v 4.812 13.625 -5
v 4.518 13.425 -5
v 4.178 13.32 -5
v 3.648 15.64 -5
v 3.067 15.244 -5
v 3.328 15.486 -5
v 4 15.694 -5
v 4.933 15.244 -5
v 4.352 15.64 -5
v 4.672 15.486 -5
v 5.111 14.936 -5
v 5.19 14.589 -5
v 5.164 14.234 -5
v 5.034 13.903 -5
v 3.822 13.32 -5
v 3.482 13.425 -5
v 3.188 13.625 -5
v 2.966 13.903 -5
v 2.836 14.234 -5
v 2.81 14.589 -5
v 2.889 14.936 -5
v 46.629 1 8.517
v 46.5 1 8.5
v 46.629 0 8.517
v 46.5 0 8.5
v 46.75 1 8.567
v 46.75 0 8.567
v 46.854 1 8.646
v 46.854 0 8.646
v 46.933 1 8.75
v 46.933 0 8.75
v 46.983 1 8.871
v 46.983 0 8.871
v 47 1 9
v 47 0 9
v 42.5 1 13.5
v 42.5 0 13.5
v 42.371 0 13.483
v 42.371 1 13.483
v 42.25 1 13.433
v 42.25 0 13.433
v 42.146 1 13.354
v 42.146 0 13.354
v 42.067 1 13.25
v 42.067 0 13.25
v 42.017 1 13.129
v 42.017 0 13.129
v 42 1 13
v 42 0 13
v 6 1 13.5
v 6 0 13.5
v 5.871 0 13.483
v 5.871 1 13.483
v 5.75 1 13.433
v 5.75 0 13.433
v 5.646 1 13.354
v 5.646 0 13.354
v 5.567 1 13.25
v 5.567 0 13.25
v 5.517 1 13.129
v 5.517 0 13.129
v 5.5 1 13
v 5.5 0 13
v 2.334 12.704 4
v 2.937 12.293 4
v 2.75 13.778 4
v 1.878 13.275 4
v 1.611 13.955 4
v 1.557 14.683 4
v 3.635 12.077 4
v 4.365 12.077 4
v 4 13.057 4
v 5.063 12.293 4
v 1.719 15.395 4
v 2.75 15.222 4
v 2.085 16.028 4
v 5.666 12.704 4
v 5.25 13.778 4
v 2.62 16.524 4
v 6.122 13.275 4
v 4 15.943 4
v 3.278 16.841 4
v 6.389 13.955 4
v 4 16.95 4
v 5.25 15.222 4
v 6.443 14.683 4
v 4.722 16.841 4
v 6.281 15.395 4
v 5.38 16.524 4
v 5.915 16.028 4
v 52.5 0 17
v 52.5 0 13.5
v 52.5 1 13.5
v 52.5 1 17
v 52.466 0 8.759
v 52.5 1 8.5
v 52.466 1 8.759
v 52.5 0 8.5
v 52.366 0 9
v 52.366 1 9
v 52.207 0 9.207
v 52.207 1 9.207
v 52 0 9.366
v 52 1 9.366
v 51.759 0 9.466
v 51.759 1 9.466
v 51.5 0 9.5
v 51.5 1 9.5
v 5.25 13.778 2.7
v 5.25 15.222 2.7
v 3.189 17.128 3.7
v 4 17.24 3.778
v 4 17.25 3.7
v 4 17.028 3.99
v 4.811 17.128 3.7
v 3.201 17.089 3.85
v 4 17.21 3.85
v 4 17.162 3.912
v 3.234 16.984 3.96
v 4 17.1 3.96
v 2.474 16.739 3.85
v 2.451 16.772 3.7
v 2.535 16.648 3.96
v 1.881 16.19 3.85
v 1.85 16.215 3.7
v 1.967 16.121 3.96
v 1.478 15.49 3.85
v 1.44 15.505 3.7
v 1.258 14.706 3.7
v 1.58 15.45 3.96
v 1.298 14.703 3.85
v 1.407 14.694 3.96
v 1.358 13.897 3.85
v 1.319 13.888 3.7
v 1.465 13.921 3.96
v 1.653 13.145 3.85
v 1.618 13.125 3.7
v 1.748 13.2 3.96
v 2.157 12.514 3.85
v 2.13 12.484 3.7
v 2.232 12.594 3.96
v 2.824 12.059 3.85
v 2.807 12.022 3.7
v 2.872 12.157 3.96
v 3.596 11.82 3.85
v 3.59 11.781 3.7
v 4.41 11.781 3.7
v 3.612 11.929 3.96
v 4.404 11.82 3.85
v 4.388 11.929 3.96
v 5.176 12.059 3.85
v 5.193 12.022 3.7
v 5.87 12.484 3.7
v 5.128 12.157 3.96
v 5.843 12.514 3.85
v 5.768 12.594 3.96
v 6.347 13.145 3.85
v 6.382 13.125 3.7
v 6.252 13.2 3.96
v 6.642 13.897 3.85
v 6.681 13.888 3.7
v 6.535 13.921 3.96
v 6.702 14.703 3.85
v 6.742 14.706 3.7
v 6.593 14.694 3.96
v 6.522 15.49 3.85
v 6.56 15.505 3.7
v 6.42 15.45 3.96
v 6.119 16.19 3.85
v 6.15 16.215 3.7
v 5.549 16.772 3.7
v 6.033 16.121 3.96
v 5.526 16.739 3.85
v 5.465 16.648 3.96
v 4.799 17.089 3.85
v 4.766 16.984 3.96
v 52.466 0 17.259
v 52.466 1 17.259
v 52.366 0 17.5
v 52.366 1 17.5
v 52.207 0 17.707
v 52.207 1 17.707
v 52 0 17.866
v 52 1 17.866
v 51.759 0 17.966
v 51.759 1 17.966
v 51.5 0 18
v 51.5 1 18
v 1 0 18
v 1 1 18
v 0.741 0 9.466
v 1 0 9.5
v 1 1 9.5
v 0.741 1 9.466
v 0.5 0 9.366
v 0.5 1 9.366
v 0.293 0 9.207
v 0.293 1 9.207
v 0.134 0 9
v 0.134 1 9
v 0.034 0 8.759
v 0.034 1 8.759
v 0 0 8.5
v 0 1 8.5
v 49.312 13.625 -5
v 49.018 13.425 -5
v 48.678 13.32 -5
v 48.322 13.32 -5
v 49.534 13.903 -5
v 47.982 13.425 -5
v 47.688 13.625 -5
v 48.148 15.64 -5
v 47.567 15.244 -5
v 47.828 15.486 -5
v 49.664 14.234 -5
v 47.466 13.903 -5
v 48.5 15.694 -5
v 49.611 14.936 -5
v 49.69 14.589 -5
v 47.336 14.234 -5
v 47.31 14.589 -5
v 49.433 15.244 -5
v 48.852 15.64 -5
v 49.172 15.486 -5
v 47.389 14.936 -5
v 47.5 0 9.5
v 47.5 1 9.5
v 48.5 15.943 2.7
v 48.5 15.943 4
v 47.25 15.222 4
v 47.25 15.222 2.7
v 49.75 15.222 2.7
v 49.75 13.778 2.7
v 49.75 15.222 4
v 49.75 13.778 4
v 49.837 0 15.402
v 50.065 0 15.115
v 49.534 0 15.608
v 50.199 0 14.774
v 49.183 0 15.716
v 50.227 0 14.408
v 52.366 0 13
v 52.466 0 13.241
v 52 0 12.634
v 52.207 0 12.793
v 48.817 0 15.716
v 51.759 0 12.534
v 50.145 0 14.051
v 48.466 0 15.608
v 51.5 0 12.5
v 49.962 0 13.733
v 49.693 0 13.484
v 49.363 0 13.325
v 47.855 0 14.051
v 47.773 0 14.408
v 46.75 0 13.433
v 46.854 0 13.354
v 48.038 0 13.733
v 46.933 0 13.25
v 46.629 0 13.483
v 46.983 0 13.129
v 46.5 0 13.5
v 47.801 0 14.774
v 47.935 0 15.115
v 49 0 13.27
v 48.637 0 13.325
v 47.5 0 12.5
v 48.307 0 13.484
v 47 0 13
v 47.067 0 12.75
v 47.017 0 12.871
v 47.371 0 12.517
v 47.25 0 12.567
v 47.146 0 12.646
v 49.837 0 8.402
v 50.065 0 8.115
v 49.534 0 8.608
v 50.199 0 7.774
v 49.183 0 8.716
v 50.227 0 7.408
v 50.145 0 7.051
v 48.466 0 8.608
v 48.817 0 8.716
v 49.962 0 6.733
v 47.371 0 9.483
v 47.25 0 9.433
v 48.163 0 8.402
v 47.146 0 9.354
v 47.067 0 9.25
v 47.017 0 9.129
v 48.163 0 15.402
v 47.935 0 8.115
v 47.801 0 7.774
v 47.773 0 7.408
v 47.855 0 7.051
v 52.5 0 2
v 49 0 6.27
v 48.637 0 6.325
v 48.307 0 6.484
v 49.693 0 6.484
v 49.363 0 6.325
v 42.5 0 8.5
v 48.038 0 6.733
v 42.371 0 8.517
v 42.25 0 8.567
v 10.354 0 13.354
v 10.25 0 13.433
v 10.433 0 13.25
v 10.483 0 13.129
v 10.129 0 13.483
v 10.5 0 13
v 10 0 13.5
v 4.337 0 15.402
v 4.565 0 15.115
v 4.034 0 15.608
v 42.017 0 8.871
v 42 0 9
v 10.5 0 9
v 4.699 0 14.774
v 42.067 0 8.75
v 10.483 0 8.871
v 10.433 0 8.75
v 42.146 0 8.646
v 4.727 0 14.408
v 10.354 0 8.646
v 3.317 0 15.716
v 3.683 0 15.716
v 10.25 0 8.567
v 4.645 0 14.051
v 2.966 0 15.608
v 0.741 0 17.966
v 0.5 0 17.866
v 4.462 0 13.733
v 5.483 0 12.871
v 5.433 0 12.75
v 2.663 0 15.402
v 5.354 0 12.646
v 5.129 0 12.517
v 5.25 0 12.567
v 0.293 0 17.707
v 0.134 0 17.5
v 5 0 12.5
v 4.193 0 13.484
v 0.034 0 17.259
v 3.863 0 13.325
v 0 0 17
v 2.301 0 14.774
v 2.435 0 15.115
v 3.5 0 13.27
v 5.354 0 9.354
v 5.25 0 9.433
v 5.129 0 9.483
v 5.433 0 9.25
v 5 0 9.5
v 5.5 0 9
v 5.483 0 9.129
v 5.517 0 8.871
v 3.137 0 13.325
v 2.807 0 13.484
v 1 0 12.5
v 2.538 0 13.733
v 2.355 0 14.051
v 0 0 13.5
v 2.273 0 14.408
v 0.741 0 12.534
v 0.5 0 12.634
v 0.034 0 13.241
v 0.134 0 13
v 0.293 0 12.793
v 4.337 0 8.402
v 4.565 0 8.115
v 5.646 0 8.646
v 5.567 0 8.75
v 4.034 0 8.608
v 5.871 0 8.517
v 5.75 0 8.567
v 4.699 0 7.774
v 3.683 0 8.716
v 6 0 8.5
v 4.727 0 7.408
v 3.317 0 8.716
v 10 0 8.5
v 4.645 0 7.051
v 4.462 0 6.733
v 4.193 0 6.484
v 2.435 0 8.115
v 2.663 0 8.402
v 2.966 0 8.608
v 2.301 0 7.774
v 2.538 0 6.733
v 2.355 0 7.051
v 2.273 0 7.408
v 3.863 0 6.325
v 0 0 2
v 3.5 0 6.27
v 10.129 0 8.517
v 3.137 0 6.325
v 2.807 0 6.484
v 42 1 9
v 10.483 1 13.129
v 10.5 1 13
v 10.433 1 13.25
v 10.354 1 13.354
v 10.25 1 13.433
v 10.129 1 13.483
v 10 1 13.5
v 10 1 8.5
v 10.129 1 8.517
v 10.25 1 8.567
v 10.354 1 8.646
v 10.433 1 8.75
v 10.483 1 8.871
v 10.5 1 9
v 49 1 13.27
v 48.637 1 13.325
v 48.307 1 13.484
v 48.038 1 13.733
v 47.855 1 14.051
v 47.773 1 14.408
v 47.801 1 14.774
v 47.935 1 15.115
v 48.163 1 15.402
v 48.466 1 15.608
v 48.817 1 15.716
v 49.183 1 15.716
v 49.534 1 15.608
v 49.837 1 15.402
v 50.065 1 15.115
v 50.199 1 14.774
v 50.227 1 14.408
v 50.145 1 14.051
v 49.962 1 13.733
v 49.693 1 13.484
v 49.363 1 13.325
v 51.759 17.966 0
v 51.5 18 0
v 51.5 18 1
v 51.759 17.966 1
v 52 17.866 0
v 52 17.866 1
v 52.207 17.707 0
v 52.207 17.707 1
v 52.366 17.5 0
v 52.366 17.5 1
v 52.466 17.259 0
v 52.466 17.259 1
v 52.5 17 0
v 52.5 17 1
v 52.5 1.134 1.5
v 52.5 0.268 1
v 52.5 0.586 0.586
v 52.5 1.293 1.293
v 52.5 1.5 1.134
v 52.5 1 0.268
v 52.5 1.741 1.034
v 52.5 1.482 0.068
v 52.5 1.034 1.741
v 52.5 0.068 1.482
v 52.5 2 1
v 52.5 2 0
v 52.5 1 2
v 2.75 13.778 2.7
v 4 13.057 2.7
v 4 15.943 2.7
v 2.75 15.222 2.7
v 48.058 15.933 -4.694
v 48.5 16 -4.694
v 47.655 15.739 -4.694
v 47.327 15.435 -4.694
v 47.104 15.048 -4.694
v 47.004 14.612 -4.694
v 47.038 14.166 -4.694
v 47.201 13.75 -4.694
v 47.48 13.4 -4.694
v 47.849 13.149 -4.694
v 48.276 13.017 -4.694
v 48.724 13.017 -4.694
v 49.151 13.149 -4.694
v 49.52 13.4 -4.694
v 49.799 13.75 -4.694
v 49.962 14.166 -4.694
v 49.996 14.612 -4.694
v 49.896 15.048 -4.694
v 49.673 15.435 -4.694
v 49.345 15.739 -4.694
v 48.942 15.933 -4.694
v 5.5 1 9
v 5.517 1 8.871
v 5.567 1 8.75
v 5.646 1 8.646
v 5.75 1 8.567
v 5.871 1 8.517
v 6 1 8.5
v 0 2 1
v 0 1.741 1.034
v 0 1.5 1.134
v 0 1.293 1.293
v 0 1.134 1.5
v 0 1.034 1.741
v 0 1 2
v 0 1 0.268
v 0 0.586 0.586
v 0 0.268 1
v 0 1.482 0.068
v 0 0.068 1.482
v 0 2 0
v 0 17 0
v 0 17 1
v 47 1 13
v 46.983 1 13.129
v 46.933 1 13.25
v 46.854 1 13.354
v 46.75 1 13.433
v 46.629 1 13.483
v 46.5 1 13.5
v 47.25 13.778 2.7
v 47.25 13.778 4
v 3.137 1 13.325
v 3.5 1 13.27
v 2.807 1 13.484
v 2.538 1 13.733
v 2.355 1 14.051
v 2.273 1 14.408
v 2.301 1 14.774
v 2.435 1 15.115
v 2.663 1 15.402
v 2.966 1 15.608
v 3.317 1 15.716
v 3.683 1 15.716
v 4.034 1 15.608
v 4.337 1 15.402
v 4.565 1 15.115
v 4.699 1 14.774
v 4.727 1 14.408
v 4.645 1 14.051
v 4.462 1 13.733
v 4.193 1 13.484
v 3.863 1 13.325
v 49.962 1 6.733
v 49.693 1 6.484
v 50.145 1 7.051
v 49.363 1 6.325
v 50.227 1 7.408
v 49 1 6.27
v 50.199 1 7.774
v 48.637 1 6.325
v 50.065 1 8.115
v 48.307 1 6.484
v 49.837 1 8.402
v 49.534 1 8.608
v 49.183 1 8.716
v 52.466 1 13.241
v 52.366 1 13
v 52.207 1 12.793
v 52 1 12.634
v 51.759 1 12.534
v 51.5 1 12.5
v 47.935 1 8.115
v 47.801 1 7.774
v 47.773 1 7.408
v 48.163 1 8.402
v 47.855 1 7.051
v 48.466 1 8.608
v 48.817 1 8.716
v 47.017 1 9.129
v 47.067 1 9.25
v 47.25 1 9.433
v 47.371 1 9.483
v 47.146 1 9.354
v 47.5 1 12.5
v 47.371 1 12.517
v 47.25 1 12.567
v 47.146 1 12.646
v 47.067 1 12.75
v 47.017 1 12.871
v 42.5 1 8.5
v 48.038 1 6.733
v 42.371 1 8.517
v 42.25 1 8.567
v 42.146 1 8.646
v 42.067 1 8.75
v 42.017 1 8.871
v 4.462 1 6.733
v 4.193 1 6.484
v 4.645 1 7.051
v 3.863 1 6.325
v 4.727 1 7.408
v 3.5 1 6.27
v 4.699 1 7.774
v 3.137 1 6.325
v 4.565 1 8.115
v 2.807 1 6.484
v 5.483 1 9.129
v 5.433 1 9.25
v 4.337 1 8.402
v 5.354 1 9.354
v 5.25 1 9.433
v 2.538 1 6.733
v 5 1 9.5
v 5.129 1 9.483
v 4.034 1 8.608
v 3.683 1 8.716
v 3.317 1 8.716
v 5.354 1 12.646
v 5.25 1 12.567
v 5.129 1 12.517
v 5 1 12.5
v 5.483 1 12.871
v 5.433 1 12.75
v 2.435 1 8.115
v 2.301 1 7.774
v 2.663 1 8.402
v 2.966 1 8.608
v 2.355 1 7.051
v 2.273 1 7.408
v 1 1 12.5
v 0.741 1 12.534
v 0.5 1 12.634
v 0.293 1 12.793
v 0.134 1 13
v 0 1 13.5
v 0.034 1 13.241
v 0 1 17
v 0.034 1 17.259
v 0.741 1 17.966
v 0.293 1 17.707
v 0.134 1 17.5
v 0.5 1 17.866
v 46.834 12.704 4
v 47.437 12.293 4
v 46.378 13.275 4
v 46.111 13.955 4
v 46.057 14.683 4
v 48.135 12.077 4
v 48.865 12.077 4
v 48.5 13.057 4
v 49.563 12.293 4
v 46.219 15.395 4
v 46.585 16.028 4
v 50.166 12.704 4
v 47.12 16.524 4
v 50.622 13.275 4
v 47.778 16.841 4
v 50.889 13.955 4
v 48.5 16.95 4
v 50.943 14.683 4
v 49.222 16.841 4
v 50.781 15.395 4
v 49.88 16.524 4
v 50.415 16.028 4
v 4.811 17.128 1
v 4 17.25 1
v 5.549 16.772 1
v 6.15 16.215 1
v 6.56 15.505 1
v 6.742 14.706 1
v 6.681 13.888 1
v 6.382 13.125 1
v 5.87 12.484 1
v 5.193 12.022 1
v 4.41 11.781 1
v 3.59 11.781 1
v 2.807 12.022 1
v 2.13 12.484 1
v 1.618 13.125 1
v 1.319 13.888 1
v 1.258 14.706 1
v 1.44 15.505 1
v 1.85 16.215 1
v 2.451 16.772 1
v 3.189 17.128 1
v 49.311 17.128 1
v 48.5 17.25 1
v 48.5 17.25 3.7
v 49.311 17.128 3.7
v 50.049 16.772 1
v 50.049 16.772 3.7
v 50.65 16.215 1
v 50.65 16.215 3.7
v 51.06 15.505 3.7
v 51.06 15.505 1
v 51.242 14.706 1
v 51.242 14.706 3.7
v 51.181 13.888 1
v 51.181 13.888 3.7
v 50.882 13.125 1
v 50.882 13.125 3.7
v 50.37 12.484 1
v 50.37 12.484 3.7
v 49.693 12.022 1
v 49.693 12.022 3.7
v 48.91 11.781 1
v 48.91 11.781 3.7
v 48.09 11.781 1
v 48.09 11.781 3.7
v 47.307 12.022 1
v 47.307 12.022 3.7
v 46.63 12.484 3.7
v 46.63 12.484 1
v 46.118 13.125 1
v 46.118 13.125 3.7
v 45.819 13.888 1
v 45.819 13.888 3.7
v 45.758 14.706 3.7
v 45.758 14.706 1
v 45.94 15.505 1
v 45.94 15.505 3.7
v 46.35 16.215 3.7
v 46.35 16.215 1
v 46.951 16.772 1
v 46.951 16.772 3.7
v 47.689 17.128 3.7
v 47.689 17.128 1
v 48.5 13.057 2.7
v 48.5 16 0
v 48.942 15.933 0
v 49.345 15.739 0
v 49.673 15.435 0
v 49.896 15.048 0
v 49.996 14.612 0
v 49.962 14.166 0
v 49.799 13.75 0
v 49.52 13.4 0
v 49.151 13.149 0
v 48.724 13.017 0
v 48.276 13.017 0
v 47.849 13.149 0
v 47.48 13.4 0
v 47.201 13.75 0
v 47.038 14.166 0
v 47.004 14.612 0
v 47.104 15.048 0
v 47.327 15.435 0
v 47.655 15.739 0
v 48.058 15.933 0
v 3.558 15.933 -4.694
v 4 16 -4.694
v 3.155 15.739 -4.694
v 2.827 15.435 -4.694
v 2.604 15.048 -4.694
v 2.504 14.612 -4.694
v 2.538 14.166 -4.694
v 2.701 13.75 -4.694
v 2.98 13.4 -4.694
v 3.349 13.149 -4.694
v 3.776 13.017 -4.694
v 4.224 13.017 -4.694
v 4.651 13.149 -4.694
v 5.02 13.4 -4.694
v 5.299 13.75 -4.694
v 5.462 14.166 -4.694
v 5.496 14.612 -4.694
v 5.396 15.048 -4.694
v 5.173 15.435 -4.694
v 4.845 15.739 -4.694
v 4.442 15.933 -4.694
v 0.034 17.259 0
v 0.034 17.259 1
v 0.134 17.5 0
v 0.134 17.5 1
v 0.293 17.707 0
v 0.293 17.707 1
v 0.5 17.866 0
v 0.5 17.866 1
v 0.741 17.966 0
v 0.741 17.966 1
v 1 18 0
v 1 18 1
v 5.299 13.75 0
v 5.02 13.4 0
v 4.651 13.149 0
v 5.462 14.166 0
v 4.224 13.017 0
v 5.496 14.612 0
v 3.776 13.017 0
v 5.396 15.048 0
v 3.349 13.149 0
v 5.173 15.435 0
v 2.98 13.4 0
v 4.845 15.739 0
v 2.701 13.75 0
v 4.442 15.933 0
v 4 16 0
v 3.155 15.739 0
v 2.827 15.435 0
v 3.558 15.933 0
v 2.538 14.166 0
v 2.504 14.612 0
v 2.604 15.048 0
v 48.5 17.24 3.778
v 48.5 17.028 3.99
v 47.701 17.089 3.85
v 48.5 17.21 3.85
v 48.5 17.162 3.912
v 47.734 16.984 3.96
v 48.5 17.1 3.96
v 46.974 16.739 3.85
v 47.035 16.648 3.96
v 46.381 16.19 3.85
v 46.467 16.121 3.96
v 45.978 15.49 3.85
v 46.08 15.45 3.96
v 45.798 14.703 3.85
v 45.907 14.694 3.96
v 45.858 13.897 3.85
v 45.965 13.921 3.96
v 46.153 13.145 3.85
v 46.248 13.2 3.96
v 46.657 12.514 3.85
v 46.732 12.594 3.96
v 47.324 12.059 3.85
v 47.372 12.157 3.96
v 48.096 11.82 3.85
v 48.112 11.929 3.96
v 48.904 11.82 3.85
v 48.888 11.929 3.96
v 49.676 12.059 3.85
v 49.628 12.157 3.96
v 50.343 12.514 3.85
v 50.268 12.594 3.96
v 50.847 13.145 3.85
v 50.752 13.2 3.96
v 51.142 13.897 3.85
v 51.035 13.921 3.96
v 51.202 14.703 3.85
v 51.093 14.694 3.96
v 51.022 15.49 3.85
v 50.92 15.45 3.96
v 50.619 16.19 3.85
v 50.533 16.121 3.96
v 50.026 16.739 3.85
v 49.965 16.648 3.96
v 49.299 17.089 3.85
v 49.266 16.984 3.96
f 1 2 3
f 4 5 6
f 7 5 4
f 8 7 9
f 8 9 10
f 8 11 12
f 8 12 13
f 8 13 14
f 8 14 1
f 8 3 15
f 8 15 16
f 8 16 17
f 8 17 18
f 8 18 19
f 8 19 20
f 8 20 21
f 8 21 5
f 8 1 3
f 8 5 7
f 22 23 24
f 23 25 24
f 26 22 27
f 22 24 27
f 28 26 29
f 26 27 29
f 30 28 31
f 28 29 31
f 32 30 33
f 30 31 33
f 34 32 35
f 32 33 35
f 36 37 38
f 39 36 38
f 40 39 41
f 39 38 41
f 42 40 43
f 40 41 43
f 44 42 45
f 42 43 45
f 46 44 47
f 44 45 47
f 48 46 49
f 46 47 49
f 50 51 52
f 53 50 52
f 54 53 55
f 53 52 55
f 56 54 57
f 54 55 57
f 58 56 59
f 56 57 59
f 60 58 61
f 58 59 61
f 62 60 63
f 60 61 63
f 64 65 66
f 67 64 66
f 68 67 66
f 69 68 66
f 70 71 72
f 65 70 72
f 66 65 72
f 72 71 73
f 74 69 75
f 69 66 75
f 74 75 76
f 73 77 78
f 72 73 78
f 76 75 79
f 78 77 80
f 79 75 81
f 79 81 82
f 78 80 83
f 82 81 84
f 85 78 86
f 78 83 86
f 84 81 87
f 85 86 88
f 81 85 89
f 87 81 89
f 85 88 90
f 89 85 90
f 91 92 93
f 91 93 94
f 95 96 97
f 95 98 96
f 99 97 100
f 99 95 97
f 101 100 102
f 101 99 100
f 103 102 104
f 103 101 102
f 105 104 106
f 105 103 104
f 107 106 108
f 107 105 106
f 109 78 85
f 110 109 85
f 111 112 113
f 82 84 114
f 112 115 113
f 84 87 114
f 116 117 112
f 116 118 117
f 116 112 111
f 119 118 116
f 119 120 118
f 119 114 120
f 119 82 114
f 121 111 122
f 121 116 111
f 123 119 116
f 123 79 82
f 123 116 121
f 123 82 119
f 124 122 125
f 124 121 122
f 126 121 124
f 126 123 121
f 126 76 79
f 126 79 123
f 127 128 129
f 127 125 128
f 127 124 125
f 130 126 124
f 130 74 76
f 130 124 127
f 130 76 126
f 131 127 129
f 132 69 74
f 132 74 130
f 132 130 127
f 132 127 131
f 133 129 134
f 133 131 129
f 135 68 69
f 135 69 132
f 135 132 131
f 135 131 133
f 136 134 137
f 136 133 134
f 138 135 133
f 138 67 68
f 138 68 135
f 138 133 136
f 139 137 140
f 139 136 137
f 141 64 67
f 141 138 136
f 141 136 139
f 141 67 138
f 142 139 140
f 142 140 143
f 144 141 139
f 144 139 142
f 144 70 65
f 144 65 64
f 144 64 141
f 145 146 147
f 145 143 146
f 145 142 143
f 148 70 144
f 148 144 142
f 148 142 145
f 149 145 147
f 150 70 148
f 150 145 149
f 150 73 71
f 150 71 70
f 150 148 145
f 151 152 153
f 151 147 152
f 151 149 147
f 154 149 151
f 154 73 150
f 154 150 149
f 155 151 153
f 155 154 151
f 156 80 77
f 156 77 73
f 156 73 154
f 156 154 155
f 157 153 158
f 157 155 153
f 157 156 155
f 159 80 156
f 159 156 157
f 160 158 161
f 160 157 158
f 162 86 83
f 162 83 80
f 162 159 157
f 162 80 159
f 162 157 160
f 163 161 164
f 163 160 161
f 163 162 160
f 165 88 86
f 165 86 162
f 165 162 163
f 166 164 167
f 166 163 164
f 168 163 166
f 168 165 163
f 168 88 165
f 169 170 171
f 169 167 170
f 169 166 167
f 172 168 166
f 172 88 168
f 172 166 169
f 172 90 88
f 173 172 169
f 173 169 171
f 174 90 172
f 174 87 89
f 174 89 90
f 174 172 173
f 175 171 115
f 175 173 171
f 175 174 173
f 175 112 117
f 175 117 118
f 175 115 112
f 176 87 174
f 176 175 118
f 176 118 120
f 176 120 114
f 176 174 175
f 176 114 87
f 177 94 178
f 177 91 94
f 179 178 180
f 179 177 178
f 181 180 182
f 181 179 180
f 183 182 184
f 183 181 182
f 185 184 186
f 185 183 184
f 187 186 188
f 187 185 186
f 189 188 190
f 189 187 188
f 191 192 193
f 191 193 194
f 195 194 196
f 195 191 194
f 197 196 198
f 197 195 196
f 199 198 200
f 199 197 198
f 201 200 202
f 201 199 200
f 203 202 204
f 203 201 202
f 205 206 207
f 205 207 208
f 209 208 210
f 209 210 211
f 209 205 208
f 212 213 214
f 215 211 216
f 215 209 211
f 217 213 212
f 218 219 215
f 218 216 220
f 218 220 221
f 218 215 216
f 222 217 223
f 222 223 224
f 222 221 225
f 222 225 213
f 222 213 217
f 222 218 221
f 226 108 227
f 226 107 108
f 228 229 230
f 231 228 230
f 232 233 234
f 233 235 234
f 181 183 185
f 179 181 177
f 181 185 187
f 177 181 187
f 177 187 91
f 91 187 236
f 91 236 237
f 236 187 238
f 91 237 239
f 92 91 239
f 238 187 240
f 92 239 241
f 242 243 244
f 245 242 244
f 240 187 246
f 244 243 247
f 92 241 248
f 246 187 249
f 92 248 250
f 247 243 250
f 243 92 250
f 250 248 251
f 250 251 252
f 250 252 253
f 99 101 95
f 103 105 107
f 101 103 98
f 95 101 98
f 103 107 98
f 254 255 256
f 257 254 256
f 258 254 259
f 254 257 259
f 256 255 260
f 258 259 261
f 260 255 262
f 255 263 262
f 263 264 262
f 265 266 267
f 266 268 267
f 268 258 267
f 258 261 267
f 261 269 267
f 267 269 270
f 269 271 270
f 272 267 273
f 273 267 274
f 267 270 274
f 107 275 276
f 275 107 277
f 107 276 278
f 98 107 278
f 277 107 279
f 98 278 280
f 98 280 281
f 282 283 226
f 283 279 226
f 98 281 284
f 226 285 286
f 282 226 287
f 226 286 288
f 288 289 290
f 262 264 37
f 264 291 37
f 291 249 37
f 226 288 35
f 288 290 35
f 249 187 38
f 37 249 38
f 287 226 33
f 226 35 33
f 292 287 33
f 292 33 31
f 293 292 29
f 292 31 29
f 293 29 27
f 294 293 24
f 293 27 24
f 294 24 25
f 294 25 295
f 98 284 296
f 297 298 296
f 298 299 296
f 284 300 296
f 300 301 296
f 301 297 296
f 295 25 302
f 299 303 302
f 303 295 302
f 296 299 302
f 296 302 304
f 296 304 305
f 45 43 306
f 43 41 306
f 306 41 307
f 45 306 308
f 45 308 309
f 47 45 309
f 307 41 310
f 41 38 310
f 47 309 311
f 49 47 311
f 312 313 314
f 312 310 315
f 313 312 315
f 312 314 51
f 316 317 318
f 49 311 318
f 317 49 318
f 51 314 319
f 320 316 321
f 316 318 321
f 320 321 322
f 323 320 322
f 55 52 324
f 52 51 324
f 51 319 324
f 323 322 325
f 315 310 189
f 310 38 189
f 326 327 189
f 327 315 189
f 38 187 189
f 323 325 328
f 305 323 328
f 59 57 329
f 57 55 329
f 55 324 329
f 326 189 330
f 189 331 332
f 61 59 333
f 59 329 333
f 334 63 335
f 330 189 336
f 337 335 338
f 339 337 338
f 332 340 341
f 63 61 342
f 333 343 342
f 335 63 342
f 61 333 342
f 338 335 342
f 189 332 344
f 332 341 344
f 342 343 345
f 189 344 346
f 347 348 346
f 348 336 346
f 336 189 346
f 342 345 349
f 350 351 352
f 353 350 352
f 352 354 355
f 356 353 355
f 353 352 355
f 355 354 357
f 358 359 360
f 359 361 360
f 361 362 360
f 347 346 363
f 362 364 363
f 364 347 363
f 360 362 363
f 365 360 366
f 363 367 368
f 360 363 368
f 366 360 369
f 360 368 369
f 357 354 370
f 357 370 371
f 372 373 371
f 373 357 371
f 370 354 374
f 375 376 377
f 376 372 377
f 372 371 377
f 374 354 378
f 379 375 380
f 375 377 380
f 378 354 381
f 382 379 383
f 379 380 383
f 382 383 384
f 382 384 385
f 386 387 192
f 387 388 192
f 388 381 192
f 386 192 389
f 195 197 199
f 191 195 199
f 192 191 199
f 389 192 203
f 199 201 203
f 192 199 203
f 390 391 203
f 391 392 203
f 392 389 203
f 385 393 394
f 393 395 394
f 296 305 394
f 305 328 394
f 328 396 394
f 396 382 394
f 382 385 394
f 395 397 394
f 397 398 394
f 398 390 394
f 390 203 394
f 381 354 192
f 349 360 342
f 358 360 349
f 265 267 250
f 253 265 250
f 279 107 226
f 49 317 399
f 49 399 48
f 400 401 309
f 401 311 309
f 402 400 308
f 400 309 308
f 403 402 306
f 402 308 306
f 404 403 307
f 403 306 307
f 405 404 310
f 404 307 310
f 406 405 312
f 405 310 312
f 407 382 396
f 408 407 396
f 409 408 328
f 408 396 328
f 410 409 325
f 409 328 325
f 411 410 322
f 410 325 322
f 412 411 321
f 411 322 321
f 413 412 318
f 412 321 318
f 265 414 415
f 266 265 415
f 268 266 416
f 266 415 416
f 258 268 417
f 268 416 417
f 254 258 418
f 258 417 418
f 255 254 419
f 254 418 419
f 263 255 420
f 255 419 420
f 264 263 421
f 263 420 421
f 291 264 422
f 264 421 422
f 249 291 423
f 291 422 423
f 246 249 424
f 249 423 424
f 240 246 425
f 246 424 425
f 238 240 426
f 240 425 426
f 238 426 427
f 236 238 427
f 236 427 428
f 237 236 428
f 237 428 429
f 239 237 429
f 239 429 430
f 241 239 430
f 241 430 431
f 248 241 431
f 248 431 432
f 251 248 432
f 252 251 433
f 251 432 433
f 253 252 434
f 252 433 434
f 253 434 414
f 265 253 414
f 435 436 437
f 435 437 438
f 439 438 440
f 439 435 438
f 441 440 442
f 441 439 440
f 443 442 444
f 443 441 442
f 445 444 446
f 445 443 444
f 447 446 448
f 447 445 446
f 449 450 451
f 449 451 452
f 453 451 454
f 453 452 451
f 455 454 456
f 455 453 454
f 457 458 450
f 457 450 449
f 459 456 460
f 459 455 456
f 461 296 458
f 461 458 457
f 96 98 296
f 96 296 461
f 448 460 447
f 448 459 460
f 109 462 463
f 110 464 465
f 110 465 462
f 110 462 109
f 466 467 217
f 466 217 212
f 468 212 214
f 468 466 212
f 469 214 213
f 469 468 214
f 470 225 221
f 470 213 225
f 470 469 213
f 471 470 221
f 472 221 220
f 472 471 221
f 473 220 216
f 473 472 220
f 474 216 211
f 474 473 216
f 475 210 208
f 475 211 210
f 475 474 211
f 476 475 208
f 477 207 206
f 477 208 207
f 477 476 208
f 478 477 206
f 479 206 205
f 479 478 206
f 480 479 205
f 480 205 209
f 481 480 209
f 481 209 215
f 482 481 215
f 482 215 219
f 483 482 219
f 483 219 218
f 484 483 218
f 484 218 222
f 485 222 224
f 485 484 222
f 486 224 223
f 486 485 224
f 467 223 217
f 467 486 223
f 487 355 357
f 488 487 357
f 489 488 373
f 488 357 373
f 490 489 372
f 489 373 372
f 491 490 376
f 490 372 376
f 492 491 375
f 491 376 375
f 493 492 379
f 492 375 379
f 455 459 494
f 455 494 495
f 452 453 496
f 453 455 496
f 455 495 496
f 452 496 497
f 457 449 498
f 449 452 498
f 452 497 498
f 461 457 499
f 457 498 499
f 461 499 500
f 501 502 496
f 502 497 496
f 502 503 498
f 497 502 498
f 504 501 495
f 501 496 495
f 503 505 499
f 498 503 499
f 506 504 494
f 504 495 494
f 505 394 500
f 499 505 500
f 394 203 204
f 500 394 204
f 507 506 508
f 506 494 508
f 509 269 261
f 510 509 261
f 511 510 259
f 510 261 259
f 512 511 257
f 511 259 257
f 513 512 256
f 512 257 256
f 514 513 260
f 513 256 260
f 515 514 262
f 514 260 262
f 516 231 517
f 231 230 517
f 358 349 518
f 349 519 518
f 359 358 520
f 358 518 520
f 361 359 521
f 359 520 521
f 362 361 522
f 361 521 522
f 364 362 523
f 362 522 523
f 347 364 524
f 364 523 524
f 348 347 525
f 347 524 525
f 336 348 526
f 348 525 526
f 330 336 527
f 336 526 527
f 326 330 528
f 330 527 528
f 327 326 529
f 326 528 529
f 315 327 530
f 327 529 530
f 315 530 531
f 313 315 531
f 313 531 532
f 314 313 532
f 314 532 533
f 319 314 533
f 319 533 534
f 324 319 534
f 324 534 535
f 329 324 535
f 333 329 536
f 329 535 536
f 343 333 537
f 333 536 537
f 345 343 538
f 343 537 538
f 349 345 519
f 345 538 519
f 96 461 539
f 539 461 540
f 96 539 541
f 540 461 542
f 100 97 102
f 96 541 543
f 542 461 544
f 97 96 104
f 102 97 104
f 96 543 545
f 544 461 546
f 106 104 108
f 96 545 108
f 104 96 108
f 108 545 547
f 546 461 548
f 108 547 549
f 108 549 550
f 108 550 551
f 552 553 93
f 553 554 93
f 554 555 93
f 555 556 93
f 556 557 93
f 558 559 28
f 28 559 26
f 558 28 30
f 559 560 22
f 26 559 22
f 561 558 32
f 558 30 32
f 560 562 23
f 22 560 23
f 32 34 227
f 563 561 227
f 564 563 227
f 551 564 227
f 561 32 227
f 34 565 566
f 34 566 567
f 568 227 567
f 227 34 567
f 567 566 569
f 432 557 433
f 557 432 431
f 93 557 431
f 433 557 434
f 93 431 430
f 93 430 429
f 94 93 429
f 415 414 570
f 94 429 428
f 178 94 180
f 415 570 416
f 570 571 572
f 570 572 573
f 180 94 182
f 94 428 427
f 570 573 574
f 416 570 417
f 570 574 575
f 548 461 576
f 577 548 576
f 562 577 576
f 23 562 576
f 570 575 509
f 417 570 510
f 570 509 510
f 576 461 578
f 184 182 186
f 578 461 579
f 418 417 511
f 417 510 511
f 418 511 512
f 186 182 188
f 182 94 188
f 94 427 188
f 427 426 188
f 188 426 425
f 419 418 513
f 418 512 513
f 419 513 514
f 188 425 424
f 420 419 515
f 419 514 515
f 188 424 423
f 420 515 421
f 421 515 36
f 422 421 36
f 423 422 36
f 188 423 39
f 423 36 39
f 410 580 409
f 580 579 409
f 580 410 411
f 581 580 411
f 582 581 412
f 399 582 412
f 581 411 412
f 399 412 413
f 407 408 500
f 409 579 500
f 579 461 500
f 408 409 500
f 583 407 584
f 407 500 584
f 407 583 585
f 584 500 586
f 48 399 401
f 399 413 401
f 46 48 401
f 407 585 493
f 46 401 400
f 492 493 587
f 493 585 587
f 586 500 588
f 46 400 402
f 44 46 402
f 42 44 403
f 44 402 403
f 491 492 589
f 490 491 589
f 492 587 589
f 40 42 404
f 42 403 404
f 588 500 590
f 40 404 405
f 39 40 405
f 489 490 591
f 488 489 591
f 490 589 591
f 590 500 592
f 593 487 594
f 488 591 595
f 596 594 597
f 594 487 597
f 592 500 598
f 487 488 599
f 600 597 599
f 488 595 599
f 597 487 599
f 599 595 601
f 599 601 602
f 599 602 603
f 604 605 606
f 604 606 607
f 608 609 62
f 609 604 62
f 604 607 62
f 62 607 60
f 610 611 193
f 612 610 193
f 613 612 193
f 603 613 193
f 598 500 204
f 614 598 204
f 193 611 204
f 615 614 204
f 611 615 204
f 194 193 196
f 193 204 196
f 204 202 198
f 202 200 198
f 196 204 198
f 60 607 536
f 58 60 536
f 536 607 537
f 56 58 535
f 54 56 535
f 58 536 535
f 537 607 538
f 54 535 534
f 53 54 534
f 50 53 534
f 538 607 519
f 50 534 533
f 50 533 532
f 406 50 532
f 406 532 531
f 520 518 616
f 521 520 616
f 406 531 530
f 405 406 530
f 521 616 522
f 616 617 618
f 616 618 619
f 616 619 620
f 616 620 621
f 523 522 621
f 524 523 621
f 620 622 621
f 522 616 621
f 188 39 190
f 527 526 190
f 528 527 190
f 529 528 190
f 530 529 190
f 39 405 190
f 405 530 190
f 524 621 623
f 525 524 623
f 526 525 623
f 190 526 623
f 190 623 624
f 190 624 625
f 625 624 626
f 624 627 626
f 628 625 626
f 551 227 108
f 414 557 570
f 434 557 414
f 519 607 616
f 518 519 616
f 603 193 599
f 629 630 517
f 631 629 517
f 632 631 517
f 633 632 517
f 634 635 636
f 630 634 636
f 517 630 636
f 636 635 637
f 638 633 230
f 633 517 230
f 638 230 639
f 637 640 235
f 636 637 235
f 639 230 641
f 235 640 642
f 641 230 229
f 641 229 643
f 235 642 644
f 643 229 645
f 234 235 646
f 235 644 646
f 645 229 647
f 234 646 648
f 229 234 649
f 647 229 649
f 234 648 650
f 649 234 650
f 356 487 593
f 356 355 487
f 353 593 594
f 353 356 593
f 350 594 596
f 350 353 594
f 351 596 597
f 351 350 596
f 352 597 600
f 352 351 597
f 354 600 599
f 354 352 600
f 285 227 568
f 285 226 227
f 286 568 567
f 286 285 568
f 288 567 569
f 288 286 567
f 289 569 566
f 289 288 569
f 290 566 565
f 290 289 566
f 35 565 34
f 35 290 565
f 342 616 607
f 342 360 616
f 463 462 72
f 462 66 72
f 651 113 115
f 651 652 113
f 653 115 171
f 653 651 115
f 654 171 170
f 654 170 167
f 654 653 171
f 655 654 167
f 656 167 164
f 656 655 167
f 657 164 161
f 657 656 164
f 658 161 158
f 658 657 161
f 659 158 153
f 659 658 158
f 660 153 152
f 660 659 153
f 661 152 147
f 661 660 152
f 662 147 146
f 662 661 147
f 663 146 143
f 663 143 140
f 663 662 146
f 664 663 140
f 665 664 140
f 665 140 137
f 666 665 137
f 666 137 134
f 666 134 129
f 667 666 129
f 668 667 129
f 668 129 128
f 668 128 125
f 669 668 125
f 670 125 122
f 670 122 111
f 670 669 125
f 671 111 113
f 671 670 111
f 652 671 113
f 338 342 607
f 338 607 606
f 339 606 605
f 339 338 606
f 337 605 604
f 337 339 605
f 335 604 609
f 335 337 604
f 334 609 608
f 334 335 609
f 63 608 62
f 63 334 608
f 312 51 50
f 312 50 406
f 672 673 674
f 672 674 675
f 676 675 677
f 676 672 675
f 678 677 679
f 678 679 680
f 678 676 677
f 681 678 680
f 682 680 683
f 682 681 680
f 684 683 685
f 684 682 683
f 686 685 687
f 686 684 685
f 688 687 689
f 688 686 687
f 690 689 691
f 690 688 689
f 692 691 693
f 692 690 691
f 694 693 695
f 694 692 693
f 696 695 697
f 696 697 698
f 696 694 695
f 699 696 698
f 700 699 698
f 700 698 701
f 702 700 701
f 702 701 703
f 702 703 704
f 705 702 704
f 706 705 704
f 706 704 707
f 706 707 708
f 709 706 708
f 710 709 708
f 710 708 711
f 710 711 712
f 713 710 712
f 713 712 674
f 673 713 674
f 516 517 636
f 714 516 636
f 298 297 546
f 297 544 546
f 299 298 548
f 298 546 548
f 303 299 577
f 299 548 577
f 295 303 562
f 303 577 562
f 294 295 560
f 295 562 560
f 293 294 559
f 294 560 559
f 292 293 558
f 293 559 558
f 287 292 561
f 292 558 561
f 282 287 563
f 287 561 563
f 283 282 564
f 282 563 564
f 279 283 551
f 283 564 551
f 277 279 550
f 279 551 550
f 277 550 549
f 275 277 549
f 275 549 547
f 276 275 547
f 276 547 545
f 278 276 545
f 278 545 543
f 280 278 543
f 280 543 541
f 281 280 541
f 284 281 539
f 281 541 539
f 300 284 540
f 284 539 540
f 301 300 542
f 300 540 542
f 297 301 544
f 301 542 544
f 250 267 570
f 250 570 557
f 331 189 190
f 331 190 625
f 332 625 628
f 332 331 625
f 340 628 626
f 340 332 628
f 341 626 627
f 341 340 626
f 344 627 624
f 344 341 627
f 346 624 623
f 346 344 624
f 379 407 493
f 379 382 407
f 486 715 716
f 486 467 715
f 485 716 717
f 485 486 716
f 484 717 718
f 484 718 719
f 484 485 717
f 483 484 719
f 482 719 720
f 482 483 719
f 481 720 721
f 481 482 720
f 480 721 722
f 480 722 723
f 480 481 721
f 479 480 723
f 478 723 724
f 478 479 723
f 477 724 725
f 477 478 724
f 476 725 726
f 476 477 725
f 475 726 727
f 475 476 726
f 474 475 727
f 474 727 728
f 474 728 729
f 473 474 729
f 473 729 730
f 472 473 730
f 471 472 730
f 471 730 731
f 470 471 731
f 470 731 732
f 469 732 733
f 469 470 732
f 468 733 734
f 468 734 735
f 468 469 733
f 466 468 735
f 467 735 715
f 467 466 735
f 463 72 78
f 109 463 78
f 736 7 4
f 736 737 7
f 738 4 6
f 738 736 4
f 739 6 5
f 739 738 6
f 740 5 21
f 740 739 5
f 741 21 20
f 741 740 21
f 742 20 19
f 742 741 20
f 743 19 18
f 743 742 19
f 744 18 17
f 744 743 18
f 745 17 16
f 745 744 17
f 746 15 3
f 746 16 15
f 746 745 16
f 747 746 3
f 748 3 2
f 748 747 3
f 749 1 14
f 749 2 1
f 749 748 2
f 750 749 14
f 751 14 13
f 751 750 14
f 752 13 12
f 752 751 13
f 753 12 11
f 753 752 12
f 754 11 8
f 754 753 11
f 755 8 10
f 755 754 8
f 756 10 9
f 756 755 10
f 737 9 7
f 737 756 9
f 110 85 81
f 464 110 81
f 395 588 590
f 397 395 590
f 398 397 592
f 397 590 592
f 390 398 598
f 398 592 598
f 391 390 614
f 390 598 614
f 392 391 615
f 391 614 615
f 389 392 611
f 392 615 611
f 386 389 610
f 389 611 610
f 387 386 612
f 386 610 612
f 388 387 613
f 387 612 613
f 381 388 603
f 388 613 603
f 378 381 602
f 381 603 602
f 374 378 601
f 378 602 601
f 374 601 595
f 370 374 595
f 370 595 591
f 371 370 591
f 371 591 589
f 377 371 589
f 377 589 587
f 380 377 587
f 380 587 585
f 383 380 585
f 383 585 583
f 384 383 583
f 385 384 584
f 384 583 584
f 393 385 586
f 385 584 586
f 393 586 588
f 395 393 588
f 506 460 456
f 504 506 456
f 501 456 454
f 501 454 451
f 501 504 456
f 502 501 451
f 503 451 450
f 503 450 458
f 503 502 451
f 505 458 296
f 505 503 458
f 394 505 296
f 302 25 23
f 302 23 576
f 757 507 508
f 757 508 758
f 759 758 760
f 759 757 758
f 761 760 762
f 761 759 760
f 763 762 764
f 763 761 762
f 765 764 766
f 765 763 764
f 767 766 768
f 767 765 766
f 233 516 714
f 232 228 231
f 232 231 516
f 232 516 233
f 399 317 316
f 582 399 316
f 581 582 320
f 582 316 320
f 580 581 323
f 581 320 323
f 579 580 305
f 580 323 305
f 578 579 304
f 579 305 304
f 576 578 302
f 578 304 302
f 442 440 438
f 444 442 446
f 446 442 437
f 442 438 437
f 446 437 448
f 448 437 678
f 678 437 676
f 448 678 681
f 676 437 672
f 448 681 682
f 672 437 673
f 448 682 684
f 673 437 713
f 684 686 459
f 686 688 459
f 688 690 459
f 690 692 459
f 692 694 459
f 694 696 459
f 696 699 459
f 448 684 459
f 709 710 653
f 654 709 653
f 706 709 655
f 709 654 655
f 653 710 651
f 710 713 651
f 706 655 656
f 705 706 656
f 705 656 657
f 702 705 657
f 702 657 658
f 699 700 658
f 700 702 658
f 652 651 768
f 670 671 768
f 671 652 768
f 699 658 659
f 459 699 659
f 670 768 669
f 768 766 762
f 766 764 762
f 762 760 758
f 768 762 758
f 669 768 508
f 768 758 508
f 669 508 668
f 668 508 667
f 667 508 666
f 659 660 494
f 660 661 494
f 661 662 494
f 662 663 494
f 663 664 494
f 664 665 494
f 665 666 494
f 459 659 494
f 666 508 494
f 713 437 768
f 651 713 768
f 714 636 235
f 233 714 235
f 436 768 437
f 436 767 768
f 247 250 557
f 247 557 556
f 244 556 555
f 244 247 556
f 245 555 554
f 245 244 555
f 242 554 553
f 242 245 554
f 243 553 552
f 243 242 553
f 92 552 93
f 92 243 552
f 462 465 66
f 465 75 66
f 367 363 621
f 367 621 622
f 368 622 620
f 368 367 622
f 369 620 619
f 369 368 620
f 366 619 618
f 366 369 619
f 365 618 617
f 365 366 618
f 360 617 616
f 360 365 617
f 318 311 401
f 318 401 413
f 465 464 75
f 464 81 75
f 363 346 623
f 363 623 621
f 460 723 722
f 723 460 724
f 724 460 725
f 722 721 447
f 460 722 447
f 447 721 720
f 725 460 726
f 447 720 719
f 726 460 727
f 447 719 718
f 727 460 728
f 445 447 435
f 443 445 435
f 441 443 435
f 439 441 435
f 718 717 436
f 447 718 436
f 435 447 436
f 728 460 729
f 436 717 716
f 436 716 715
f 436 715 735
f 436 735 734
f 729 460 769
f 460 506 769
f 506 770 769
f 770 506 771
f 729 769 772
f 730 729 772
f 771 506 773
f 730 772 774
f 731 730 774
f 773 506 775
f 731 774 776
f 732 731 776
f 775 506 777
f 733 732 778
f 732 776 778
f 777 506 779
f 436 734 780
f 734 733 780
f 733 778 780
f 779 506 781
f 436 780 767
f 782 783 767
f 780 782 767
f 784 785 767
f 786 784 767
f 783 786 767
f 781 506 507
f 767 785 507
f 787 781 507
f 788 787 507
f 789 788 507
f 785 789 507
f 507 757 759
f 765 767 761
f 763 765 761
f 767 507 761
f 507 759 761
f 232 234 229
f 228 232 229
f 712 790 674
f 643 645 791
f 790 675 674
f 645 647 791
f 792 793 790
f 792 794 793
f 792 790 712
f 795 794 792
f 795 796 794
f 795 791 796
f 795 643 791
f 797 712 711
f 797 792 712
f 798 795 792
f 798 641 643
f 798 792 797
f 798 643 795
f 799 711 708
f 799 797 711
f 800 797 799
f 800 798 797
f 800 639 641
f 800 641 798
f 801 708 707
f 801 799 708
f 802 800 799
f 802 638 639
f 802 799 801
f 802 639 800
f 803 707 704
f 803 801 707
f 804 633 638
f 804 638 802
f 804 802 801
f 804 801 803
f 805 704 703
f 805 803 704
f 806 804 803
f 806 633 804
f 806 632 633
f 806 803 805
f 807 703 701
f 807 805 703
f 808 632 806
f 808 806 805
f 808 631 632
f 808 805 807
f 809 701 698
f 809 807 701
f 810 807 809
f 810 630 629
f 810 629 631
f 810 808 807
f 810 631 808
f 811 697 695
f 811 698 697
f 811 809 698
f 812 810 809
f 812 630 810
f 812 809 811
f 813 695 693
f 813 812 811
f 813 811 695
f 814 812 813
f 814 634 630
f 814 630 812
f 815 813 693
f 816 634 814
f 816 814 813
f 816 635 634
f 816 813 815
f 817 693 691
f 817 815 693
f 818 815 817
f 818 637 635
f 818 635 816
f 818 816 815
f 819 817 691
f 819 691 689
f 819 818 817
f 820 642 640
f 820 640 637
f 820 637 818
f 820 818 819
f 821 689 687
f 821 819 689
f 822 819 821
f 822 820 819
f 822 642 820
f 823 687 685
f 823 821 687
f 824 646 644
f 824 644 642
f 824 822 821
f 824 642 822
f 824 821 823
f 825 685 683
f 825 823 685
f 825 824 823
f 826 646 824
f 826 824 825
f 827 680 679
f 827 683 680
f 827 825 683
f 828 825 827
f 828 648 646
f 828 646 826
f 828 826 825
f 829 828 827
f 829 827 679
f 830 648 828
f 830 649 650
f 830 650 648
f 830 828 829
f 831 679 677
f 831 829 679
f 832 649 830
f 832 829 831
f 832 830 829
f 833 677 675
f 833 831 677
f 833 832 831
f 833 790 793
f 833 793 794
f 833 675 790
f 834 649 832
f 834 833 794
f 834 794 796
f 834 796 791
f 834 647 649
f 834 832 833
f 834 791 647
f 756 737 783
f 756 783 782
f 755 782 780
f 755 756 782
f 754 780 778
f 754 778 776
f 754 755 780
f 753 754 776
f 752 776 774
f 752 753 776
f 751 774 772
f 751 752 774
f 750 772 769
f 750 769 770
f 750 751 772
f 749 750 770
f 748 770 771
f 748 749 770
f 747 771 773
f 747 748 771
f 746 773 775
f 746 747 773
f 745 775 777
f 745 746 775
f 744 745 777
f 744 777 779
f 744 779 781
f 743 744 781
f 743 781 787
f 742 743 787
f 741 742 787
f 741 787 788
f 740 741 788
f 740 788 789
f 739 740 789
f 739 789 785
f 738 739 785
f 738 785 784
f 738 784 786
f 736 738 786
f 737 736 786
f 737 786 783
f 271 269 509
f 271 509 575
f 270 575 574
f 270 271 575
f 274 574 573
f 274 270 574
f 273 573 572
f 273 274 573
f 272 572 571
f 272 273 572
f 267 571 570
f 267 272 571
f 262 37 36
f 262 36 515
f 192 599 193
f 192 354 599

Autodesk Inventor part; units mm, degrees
sketch "Sketch_1" plane through (0, 0, 0) normal (1, 0, 0) x (0, 1, 0)
  line L0 (0, 18) -> (0, 2)
  arc A0 (0, 2) -> (2, 0) centre (2, 2) ccw
  line L1 (2, 0) -> (18, 0)
  line L2 (18, 0) -> (18, 1)
  line L3 (18, 1) -> (2, 1)
  arc A1 (1, 2) -> (2, 1) centre (2, 2) ccw
  line L4 (1, 2) -> (1, 18)
  line L5 (1, 18) -> (0, 18)
extrude "Extrusion1" add sketch "Sketch_1" along normal blind 52.5
sketch "Sketch_2" plane through (0, 0, 0) normal (0, 0, 1) x (1, 0, 0)
  arc A0 (1, 18) -> (0, 17) centre (1, 17) ccw
  line L0 (1, 18) -> (51.5, 18)
  arc A1 (52.5, 17) -> (51.5, 18) centre (51.5, 17) ccw
  line L1 (52.5, 17) -> (52.5, 23)
  line L2 (52.5, 23) -> (0, 23)
  line L3 (0, 23) -> (0, 17)
extrude "Extrusion2" cut sketch "Sketch_2" along normal blind 1
sketch "Sketch_3" plane through (0, 0, 0) normal (0, 1, 0) x (-1, 0, 0)
  line L0 (5, 0) -> (5, 23)
  line L1 (5, 23) -> (-57.5, 23)
  line L2 (-57.5, 23) -> (-57.5, 0)
  line L3 (-57.5, 0) -> (-52.5, 0)
  line L4 (-52.5, 0) -> (-52.5, 8.5)
  arc A0 (-51.5, 9.5) -> (-52.5, 8.5) centre (-51.5, 8.5) ccw
  line L5 (-51.5, 9.5) -> (-47.5, 9.5)
  arc A1 (-47, 9) -> (-47.5, 9.5) centre (-47.5, 9) ccw
  arc A2 (-47, 9) -> (-46.5, 8.5) centre (-46.5, 9) ccw
  line L6 (-46.5, 8.5) -> (-42.5, 8.5)
  arc A3 (-42.5, 8.5) -> (-42, 9) centre (-42.5, 9) ccw
  line L7 (-42, 9) -> (-42, 13)
  arc A4 (-42, 13) -> (-42.5, 13.5) centre (-42.5, 13) ccw
  line L8 (-42.5, 13.5) -> (-46.5, 13.5)
  arc A5 (-46.5, 13.5) -> (-47, 13) centre (-46.5, 13) ccw
  arc A6 (-47.5, 12.5) -> (-47, 13) centre (-47.5, 13) ccw
  line L9 (-47.5, 12.5) -> (-51.5, 12.5)
  arc A7 (-52.5, 13.5) -> (-51.5, 12.5) centre (-51.5, 13.5) ccw
  line L10 (-52.5, 13.5) -> (-52.5, 17)
  arc A8 (-51.5, 18) -> (-52.5, 17) centre (-51.5, 17) ccw
  line L11 (-51.5, 18) -> (-1, 18)
  arc A9 (0, 17) -> (-1, 18) centre (-1, 17) ccw
  line L12 (0, 17) -> (0, 13.5)
  arc A10 (-1, 12.5) -> (0, 13.5) centre (-1, 13.5) ccw
  line L13 (-1, 12.5) -> (-5, 12.5)
  arc A11 (-5.5, 13) -> (-5, 12.5) centre (-5, 13) ccw
  arc A12 (-5.5, 13) -> (-6, 13.5) centre (-6, 13) ccw
  line L14 (-6, 13.5) -> (-10, 13.5)
  arc A13 (-10, 13.5) -> (-10.5, 13) centre (-10, 13) ccw
  line L15 (-10.5, 13) -> (-10.5, 9)
  arc A14 (-10.5, 9) -> (-10, 8.5) centre (-10, 9) ccw
  line L16 (-10, 8.5) -> (-6, 8.5)
  arc A15 (-6, 8.5) -> (-5.5, 9) centre (-6, 9) ccw
  arc A16 (-5, 9.5) -> (-5.5, 9) centre (-5, 9) ccw
  line L17 (-5, 9.5) -> (-1, 9.5)
  arc A17 (0, 8.5) -> (-1, 9.5) centre (-1, 8.5) ccw
  line L18 (0, 8.5) -> (0, 0)
  line L19 (0, 0) -> (5, 0)
extrude "Extrusion3" cut sketch "Sketch_3" along normal blind 1
sketch "Sketch4" plane through (0, 0, 2) normal (0, -1, 0) x (1, 0, 0)
  point P0 (3.5, 5.5)
hole "Hole1" at (3.5, 0, 7.5) direction (0, 1, 0) diameter 2.46 depth 1
pattern_linear "Rectangular Pattern1" count 2 spacing 45.5 along (1, 0, 0) count 2 spacing 7 along (0, 0, 1) of "Hole1"
sketch "Sketch_6" plane through (4, 0, 0) normal (1, 0, 0) x (0, 0, -1)
  line L0 (5, 14.5) -> (-4, 14.5)
  line L1 (-4, 14.5) -> (-4, 16.95)
  arc A0 (-3.7, 17.25) -> (-4, 16.95) centre (-3.7, 16.95) ccw
  line L2 (-3.7, 17.25) -> (-1, 17.25)
  line L3 (-1, 17.25) -> (-1, 16)
  line L4 (-1, 16) -> (4.6935, 16)
  line L5 (4.6935, 16) -> (5, 15.6935)
  line L6 (5, 15.6935) -> (5, 14.5)
  line L7 (5, 14.5) -> (-4, 14.5)
revolve "Revolution1" add sketch "Sketch_6" angle 360 about axis through (4, 14.5, -5) along (0, 0, -1)
thread "Thread1" size "M3x0.5" class "6g" standard "ISO Metric profile" length 5.1935
pattern_linear "Rectangular Pattern2" count 2 spacing 44.5 along (1, 0, 0) of "Revolution1"
sketch "Sketch_8" plane through (0, 0, 4) normal (0, 0, 1) x (1, 0, 0)
  line L0 (2.75, 13.7783) -> (4, 13.0566)
  line L1 (4, 13.0566) -> (5.25, 13.7783)
  line L2 (5.25, 13.7783) -> (5.25, 15.2217)
  line L3 (5.25, 15.2217) -> (4, 15.9434)
  line L4 (4, 15.9434) -> (2.75, 15.2217)
  line L5 (2.75, 15.2217) -> (2.75, 13.7783)
extrude "Extrusion4" cut sketch "Sketch_8" against normal blind 1.3
pattern_linear "Rectangular Pattern3" count 2 spacing 44.5 along (1, 0, 0) of "Extrusion4"
ref_plane "ip_for_dummy_1_XY" through (0, 14.5, 0) normal (1, 0, 0) x (0, 0, -1)
ref_plane "ip_for_dummy_1_YZ" through (0, 14.5, 0) normal (0, 0, -1) x (0, 1, 0)
ref_plane "ip_for_dummy_1_ZX" through (0, 14.5, 0) normal (0, 1, 0) x (1, 0, 0)
ref_plane "ip_for_dummy_2_XY" through (52.5, 14.5, 0) normal (1, 0, 0) x (0, 0, -1)
ref_plane "ip_for_dummy_2_YZ" through (52.5, 14.5, 0) normal (0, 0, -1) x (0, 1, 0)
ref_plane "ip_for_dummy_2_ZX" through (52.5, 14.5, 0) normal (0, 1, 0) x (1, 0, 0)
ref_plane "ip_for_sensor_1_XY" through (0, 1, 11) normal (1, 0, 0) x (0, 0, -1)
ref_plane "ip_for_sensor_1_YZ" through (0, 1, 11) normal (0, 0, -1) x (0, 1, 0)
ref_plane "ip_for_sensor_1_ZX" through (0, 1, 11) normal (0, 1, 0) x (1, 0, 0)
ref_plane "ip_for_sensor_2_XY" through (52.5, 1, 11) normal (1, 0, 0) x (0, 0, -1)
ref_plane "ip_for_sensor_2_YZ" through (52.5, 1, 11) normal (0, 0, -1) x (0, 1, 0)
ref_plane "ip_for_sensor_2_ZX" through (52.5, 1, 11) normal (0, 1, 0) x (1, 0, 0)
properties part number "ETH2-14-sensor_plant"
